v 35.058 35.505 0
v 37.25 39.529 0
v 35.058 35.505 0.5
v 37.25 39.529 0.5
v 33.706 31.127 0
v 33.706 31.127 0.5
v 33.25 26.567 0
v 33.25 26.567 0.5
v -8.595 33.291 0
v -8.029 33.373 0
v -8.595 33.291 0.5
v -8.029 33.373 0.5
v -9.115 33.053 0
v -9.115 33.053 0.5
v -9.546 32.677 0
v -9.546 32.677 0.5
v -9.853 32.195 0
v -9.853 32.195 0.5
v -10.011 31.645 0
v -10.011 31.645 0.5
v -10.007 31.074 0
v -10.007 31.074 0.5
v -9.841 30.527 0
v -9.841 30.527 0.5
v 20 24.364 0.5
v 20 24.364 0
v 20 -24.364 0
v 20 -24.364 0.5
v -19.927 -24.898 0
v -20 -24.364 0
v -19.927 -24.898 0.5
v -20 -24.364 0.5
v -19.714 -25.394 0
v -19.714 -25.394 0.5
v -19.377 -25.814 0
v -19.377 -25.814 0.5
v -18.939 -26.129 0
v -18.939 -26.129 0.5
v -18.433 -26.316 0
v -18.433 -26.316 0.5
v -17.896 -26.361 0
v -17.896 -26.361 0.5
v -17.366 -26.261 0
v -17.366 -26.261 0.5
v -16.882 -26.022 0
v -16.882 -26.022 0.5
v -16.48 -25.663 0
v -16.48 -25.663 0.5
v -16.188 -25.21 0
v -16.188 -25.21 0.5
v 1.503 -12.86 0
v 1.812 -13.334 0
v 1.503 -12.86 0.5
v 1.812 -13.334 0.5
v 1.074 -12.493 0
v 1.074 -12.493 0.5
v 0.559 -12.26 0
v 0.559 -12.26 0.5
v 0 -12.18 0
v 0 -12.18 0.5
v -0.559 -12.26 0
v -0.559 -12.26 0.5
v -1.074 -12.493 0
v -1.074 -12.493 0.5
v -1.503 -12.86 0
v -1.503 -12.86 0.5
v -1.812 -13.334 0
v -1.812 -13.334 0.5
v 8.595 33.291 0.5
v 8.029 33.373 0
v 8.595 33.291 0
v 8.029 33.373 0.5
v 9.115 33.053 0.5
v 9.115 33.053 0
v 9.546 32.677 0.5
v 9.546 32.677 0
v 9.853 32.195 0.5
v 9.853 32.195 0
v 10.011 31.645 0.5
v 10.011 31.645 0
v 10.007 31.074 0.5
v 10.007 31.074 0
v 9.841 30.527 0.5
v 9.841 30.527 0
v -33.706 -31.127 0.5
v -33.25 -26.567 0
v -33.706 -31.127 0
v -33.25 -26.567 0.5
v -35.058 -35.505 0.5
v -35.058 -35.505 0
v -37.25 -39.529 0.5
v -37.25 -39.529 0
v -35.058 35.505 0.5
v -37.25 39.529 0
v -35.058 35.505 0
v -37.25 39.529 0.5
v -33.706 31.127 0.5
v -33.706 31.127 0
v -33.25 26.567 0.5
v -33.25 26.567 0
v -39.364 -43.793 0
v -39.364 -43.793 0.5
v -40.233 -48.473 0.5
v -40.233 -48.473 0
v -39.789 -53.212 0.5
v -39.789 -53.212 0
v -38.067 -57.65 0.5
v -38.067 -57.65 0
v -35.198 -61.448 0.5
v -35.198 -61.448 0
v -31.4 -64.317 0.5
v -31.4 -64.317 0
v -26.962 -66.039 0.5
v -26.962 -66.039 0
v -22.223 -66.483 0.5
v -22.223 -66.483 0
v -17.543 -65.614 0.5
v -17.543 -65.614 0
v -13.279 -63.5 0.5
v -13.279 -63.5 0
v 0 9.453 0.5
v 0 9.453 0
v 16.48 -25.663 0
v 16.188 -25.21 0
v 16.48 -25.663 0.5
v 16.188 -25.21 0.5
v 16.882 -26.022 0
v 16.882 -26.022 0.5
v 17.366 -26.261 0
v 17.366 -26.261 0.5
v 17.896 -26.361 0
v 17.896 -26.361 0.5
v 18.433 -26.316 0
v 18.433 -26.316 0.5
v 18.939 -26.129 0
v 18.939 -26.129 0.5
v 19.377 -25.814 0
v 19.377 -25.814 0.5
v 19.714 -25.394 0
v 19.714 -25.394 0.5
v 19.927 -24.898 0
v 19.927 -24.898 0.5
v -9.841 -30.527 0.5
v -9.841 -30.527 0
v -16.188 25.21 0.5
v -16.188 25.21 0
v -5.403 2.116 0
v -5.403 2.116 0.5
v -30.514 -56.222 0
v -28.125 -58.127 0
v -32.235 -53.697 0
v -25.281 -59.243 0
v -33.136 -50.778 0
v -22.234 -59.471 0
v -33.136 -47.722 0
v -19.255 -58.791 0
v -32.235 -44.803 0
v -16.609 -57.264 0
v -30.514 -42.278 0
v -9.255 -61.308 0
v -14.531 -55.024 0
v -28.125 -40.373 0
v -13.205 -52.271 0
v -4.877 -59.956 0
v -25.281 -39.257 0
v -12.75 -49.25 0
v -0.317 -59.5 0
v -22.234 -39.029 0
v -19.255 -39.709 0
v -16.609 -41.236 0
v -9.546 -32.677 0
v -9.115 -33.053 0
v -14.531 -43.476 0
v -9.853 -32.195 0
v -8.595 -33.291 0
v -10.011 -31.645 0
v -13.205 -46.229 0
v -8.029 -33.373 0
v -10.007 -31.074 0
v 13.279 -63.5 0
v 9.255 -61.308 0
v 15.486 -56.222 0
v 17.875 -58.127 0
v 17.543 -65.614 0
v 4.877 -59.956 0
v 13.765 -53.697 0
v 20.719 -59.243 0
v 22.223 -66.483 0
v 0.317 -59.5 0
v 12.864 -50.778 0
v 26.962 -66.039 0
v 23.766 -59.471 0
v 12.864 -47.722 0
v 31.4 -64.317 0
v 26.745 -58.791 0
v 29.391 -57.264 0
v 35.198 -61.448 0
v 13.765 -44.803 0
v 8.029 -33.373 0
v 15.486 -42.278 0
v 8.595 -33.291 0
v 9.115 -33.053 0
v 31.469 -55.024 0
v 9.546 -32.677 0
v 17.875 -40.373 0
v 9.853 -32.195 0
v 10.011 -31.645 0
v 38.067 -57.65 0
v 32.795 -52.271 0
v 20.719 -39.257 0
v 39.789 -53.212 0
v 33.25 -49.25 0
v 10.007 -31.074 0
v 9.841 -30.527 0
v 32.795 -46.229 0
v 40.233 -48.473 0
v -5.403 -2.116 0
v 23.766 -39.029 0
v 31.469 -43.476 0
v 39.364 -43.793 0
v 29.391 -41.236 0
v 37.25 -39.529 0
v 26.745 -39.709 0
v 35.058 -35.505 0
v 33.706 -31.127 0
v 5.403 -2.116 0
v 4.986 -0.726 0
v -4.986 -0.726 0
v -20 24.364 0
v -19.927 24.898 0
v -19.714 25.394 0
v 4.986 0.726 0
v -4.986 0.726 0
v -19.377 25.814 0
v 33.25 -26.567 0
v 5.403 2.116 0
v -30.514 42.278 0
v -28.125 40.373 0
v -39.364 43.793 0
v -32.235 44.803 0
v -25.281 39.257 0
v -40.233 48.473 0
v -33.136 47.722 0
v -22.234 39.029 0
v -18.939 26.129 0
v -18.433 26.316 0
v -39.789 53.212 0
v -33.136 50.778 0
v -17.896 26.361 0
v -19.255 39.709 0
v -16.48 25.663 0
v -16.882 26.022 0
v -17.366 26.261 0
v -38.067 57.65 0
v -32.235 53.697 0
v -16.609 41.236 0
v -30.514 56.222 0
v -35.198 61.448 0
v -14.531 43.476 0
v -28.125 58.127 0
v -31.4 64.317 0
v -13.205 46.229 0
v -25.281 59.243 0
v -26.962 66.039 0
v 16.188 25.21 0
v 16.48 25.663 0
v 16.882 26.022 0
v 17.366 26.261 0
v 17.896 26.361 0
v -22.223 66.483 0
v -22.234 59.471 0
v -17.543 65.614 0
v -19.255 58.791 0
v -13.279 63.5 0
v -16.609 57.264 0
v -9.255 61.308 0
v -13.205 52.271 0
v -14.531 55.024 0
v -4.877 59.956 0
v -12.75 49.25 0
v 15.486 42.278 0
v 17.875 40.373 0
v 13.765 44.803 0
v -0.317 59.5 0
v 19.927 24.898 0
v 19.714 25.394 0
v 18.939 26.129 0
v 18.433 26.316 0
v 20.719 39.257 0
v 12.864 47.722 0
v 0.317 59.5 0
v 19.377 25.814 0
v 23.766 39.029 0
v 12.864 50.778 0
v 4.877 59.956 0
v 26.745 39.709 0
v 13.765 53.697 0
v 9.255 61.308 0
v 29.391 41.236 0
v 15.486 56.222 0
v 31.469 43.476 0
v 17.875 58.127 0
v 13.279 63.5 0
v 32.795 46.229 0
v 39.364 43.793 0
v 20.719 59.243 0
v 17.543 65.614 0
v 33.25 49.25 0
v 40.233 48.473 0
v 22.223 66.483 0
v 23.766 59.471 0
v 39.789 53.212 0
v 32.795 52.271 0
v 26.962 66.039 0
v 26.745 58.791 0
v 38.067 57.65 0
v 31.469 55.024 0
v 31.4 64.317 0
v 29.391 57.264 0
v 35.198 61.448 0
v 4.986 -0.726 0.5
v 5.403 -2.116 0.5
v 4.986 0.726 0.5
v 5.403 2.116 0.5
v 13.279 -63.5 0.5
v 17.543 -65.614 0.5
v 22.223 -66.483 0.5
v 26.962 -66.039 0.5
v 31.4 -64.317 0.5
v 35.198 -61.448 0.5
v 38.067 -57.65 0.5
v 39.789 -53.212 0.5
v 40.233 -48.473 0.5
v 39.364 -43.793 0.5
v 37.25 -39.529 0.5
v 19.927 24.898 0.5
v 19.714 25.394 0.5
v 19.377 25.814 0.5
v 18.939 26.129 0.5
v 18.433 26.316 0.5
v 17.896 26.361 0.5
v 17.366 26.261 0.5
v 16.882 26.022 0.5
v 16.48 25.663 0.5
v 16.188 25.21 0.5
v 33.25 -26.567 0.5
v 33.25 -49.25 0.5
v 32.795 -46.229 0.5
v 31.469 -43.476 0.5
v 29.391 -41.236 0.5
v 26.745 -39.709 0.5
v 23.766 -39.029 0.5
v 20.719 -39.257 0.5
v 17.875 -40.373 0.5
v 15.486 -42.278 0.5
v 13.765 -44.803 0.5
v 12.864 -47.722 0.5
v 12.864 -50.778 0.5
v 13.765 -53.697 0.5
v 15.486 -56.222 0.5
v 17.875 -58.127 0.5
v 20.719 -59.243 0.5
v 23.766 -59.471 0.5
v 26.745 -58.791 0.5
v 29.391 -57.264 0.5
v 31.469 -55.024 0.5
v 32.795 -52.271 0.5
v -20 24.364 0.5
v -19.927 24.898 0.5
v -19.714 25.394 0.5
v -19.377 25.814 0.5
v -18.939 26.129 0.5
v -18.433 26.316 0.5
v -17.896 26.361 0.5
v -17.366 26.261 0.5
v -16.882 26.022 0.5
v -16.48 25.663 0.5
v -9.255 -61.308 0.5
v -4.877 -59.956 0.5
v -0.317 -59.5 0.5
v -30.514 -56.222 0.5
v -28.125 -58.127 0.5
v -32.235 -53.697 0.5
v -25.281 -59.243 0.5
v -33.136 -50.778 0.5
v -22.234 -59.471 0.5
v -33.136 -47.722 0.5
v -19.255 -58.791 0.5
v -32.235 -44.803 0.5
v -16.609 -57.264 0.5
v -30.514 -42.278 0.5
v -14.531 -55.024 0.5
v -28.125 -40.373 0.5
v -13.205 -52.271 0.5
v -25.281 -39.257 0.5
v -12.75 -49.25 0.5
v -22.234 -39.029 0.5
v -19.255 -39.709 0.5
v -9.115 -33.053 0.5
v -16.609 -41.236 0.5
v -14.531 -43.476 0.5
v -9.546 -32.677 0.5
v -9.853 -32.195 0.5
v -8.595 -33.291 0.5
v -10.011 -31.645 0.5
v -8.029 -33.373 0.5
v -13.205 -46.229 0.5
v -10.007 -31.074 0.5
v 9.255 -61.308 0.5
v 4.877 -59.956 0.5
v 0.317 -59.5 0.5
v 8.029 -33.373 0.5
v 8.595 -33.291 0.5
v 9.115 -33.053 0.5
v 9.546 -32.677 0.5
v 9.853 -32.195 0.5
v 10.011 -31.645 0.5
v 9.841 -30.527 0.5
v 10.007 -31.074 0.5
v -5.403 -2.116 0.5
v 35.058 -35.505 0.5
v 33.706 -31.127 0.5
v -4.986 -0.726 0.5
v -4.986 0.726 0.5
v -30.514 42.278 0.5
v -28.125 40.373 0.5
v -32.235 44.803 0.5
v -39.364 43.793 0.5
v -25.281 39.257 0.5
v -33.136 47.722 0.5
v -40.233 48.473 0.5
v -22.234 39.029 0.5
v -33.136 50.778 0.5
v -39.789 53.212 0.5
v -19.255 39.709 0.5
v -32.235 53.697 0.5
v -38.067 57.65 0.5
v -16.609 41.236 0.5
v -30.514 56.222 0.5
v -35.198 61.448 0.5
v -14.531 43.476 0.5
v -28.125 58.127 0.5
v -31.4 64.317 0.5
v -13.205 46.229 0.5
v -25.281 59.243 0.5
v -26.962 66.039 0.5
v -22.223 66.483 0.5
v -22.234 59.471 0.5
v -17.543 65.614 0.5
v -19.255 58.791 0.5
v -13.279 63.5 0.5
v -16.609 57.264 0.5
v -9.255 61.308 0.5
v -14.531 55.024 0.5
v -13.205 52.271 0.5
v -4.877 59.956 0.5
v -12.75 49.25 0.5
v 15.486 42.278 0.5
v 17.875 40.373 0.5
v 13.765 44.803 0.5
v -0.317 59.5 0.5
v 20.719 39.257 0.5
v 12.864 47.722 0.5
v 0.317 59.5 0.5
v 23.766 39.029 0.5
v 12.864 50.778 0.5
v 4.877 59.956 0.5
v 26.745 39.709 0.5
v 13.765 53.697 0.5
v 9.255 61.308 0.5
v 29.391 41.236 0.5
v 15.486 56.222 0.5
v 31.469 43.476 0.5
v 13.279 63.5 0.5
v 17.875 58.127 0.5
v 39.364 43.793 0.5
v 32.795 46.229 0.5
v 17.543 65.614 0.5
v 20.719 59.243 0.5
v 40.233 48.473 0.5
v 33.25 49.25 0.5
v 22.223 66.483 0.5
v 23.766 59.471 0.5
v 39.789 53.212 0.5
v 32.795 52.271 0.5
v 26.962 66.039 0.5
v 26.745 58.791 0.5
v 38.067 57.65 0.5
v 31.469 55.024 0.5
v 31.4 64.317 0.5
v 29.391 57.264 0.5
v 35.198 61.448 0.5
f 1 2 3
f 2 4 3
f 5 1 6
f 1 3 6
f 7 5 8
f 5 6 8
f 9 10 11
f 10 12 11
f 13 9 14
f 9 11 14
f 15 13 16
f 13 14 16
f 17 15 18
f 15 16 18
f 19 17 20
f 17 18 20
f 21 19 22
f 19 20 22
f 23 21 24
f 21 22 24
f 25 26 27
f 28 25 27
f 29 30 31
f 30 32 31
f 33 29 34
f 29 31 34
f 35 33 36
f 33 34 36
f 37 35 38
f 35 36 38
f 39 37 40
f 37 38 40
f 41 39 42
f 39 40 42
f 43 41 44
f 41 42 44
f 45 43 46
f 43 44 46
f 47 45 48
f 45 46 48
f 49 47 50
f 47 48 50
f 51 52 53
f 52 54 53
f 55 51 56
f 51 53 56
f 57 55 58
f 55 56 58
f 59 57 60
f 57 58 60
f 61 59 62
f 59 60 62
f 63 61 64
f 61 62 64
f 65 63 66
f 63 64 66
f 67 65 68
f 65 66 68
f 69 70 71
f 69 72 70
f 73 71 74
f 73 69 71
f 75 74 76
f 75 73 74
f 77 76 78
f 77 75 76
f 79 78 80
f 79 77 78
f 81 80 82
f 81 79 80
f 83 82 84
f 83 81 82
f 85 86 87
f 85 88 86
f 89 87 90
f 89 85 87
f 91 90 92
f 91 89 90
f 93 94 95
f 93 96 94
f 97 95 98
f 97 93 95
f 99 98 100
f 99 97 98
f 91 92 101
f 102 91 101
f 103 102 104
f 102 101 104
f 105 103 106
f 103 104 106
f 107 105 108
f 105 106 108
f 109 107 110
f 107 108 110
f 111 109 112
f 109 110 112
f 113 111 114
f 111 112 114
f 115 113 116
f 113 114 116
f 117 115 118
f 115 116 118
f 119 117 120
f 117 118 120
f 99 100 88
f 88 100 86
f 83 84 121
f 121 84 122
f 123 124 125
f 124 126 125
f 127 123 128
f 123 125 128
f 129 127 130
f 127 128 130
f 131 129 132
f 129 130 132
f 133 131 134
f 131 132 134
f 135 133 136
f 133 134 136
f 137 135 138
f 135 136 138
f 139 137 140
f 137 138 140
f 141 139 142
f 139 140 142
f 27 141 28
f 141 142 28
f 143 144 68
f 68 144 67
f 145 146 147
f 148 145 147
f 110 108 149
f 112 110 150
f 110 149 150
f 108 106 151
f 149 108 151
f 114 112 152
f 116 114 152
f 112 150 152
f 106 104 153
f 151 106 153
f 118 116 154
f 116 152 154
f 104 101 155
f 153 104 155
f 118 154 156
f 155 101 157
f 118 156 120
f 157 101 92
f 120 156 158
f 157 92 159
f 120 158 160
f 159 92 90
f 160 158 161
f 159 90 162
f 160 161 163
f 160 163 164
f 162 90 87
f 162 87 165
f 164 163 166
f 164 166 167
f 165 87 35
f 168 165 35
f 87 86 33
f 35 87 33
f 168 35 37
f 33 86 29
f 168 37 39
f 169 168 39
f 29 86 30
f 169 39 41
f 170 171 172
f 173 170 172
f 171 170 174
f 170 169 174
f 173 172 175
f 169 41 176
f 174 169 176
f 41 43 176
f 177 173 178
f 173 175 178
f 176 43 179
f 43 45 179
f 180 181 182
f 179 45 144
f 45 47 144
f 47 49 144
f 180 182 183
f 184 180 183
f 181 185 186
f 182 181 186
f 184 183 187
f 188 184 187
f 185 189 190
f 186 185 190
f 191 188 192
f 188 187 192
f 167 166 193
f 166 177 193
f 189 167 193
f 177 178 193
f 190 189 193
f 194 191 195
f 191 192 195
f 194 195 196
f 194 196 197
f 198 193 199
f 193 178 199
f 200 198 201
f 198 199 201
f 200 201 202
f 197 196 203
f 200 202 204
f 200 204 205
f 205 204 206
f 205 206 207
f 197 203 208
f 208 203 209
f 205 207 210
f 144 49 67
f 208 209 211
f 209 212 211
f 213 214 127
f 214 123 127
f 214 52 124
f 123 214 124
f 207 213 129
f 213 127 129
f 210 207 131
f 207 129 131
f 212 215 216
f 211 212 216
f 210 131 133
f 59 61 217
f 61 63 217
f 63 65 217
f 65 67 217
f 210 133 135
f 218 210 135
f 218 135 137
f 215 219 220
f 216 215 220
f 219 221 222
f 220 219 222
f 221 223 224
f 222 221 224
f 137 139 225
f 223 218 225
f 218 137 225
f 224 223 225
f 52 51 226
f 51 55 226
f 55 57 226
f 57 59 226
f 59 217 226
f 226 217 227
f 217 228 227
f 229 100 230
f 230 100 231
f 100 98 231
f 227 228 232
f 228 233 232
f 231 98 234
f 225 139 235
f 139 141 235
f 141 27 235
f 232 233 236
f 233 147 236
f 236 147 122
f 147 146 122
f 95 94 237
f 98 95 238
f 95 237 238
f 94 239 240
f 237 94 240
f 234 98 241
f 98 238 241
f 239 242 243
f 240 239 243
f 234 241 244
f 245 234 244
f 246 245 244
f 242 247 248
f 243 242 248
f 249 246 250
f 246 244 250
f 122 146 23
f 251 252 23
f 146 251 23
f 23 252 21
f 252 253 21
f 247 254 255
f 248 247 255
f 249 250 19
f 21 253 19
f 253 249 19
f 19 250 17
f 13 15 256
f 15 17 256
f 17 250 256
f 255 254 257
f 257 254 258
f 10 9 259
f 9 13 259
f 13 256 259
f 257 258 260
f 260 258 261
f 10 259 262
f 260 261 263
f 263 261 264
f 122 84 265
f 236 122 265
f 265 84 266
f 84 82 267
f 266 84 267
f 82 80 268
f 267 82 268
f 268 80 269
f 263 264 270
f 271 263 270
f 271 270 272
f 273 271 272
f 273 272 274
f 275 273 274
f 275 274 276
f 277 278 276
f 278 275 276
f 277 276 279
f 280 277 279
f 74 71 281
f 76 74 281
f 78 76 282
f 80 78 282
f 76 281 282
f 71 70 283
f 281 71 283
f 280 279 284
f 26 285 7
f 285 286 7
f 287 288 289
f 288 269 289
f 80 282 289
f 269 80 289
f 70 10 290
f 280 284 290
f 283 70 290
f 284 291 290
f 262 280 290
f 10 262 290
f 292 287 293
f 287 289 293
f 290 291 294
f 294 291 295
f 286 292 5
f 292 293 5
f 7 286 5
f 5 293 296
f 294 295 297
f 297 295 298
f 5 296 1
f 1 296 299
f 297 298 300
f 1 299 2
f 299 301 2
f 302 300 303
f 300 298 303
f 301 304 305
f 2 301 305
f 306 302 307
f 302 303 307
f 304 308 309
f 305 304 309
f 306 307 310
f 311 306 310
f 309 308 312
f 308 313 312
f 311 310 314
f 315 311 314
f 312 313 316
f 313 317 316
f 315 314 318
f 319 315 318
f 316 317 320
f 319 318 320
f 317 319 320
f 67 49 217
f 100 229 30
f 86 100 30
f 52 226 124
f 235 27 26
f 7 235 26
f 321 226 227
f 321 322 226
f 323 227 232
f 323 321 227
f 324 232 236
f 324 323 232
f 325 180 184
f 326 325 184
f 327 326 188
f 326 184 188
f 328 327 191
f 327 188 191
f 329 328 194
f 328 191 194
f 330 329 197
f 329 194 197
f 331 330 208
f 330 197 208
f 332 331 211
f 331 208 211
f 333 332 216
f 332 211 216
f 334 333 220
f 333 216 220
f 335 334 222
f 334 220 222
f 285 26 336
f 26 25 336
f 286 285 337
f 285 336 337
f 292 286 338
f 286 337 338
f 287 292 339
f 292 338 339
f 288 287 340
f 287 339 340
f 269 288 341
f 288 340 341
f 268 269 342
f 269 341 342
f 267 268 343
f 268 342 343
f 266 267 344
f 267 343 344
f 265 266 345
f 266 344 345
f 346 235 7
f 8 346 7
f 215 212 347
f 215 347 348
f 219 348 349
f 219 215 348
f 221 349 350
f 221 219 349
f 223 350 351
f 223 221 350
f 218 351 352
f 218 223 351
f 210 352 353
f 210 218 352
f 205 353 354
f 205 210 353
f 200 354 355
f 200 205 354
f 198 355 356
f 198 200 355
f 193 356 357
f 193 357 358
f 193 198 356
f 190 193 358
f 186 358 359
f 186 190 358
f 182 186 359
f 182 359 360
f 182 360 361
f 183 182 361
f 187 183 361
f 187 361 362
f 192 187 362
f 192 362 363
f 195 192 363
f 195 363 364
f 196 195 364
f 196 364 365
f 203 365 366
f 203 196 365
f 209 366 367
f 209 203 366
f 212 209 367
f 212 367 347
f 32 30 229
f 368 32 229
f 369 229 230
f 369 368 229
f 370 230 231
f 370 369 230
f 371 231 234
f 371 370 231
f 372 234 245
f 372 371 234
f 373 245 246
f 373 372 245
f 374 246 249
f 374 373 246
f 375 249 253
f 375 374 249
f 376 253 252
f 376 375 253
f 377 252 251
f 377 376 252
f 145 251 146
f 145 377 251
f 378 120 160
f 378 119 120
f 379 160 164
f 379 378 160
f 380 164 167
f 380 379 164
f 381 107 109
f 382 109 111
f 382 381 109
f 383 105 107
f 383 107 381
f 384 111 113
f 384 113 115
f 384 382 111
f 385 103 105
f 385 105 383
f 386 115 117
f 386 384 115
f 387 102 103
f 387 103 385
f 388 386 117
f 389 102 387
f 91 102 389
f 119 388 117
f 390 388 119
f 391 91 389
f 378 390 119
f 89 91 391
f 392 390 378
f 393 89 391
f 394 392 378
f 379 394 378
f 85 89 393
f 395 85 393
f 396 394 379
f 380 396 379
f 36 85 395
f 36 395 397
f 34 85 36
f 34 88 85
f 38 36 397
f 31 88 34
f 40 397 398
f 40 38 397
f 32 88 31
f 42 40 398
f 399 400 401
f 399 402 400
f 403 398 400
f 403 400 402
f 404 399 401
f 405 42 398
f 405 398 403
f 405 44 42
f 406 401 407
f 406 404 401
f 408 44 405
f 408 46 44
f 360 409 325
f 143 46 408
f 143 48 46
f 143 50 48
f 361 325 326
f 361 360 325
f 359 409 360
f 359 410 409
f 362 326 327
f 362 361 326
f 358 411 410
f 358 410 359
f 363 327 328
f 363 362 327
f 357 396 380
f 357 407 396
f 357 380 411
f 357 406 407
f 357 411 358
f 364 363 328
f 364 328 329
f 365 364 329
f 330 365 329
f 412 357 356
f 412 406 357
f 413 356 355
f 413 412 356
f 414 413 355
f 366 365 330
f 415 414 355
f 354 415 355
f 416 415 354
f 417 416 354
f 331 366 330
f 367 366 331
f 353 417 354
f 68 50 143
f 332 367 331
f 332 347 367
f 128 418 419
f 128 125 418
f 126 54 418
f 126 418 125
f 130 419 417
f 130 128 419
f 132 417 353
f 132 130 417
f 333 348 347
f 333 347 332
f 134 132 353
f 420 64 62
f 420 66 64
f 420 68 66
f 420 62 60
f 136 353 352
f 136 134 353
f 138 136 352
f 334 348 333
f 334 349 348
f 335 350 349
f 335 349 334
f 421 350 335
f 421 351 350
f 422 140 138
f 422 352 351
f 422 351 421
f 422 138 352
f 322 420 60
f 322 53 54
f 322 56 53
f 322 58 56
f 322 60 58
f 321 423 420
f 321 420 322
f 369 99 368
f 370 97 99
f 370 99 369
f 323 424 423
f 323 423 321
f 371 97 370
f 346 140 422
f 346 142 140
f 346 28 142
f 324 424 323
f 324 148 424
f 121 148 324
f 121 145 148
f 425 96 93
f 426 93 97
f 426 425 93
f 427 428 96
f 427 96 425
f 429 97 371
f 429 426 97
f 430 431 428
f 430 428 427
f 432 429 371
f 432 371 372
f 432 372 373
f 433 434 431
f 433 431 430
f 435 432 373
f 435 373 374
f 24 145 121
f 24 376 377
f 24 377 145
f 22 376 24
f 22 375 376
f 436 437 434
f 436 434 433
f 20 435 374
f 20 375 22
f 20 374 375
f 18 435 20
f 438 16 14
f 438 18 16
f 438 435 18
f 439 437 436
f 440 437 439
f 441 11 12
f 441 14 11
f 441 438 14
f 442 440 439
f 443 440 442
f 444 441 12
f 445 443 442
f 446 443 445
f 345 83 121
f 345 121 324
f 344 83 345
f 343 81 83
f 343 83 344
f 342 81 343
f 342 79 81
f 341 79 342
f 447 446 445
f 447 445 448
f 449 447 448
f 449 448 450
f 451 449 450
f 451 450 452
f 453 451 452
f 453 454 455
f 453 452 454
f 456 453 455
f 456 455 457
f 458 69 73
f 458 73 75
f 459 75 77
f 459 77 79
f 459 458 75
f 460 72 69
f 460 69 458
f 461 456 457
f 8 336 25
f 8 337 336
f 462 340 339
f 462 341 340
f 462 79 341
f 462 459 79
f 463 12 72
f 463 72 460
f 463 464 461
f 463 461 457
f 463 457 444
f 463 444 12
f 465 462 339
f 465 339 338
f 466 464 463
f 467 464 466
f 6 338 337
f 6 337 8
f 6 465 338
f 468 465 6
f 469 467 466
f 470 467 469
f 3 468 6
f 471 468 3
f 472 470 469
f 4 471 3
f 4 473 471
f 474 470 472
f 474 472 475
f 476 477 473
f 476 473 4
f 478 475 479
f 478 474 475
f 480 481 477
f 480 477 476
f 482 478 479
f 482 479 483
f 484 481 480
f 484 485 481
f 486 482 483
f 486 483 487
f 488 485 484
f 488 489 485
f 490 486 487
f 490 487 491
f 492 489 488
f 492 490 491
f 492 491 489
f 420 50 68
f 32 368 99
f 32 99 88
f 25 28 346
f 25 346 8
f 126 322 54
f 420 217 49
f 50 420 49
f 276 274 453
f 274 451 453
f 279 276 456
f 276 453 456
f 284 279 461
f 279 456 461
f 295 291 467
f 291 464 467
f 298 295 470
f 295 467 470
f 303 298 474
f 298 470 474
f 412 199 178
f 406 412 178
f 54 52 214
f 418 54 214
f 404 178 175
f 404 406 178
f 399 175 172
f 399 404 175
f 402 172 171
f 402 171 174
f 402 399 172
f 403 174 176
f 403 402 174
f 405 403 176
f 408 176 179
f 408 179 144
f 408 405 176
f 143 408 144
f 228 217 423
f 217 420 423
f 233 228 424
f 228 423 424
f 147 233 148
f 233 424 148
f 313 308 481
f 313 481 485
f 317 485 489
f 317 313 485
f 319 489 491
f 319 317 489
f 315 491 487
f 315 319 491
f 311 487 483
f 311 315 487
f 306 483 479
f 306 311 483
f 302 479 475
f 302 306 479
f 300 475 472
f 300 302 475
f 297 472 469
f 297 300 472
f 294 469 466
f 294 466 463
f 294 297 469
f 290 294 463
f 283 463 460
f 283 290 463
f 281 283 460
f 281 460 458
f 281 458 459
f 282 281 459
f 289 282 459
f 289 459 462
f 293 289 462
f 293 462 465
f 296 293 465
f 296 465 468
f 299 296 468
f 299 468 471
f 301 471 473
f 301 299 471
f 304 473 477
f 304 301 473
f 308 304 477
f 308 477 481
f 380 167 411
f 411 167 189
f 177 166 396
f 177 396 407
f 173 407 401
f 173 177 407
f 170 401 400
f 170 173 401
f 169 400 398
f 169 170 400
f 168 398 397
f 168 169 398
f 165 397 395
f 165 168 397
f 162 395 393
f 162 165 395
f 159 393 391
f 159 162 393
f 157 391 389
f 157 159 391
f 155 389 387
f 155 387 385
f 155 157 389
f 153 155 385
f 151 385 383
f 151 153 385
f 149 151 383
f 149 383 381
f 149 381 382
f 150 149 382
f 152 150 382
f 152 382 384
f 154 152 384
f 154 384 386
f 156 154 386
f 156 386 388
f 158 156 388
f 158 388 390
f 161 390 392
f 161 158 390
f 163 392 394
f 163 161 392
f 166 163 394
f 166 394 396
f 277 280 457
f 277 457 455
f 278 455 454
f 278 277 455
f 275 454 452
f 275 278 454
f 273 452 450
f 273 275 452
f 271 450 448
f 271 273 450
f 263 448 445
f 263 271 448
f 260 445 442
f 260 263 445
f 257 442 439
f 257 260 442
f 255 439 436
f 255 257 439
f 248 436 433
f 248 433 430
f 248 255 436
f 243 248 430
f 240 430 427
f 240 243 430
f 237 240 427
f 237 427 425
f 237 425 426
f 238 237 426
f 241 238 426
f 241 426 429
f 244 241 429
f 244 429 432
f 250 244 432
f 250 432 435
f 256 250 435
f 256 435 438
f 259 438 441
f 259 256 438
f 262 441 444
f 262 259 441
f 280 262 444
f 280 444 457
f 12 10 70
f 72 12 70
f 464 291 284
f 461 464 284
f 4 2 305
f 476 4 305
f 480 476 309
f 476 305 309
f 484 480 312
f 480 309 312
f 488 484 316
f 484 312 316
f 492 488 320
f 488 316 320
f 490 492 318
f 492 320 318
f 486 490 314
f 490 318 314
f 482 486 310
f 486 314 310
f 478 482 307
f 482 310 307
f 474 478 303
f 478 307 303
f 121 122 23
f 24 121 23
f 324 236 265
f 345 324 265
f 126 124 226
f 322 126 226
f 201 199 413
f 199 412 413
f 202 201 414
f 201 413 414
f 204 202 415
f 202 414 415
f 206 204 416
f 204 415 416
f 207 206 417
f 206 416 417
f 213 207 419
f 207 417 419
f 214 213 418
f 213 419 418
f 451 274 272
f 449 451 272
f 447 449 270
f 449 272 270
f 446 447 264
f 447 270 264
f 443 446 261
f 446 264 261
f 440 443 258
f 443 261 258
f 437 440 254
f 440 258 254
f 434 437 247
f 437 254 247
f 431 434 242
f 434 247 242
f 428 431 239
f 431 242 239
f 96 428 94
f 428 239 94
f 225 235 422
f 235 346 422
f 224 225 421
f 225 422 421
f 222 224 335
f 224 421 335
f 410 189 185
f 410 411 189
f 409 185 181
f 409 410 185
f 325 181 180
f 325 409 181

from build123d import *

# Parameters (mm, degrees)
SKETCH_1_R          = 10.25
EXTRUDE_2_DEPTH     = 0.5
FILLET_1_R          = 23
CUT_EXTRUDE_1_DEPTH = 55
FILLET_2_R          = 2
FILLET_3_R          = 5


with BuildPart() as part:
    # 草图1 → 凸台-拉伸2 (new body)
    with BuildSketch(Plane.XY):
        with BuildLine():
            ThreePointArc((-9.125563074, 59.5), (-35.197591975, 61.447591975), (-33.25, 35.375563074))
            Line((-33.25, 35.375563074), (-33.25, -35.375563074))
            ThreePointArc((-33.25, -35.375563074), (-35.197591975, -61.447591975), (-9.125563074, -59.5))
            Line((-9.125563074, -59.5), (9.125563074, -59.5))
            ThreePointArc((9.125563074, -59.5), (35.197591975, -61.447591975), (33.25, -35.375563074))
            Line((33.25, -35.375563074), (33.25, 35.375563074))
            ThreePointArc((33.25, 35.375563074), (35.197591975, 61.447591975), (9.125563074, 59.5))
            Line((9.125563074, 59.5), (-9.125563074, 59.5))
        make_face()
        with Locations((23, -49.25)):
            Circle(SKETCH_1_R, mode=Mode.SUBTRACT)
        with Locations((-23, -49.25)):
            Circle(SKETCH_1_R, mode=Mode.SUBTRACT)
        with Locations((23, 49.25)):
            Circle(SKETCH_1_R, mode=Mode.SUBTRACT)
        with Locations((-23, 49.25)):
            Circle(SKETCH_1_R, mode=Mode.SUBTRACT)
    extrude(amount=EXTRUDE_2_DEPTH)

    # 圆角1
    fillet_1_edges = [part.edges().sort_by_distance(p)[0] for p in [
        (33.25, -35.375563074, 0.25),
        (9.125563074, -59.5, 0.25),
        (-9.125563074, -59.5, 0.25),
        (-33.25, -35.375563074, 0.25),
        (-33.25, 35.375563074, 0.25),
        (-9.125563074, 59.5, 0.25),
        (9.125563074, 59.5, 0.25),
        (33.25, 35.375563074, 0.25),
    ]]
    fillet(fillet_1_edges, radius=FILLET_1_R)

    # 草图2 → 切除-拉伸1 (cut)
    with BuildSketch(Plane(origin=(0, 0, 0), x_dir=(-1, 0, 0), z_dir=(0, 0, -1))):
        Polygon((20, 33.37288914), (4.414691366, 0), (20, -33.37288914), align=None)
        Polygon((-11.170617268, 33.37288914), (0, 9.453197817), (11.170617268, 33.37288914), align=None)
        Polygon((-4.414691366, 0), (-20, 33.37288914), (-20, -33.37288914), align=None)
        Polygon((11.170617268, -33.37288914), (0, -9.453197817), (-11.170617268, -33.37288914), align=None)
    extrude(amount=-CUT_EXTRUDE_1_DEPTH, mode=Mode.SUBTRACT)

    # 圆角2
    fillet_2_edges = [part.edges().sort_by_distance(p)[0] for p in [
        (20, 33.37288914, 0.25),
        (20, -33.37288914, 0.25),
        (11.170617268, 33.37288914, 0.25),
        (-11.170617268, 33.37288914, 0.25),
        (11.170617268, -33.37288914, 0.25),
        (0, -9.453197817, 0.25),
        (-11.170617268, -33.37288914, 0.25),
        (-20, 33.37288914, 0.25),
        (-20, -33.37288914, 0.25),
    ]]
    fillet(fillet_2_edges, radius=FILLET_2_R)

    # 圆角3
    fillet_3_edges = [part.edges().sort_by_distance(p)[0] for p in [
        (4.414691366, 0, 0.25),
        (-4.414691366, 0, 0.25),
    ]]
    fillet(fillet_3_edges, radius=FILLET_3_R)


solid = part.part
